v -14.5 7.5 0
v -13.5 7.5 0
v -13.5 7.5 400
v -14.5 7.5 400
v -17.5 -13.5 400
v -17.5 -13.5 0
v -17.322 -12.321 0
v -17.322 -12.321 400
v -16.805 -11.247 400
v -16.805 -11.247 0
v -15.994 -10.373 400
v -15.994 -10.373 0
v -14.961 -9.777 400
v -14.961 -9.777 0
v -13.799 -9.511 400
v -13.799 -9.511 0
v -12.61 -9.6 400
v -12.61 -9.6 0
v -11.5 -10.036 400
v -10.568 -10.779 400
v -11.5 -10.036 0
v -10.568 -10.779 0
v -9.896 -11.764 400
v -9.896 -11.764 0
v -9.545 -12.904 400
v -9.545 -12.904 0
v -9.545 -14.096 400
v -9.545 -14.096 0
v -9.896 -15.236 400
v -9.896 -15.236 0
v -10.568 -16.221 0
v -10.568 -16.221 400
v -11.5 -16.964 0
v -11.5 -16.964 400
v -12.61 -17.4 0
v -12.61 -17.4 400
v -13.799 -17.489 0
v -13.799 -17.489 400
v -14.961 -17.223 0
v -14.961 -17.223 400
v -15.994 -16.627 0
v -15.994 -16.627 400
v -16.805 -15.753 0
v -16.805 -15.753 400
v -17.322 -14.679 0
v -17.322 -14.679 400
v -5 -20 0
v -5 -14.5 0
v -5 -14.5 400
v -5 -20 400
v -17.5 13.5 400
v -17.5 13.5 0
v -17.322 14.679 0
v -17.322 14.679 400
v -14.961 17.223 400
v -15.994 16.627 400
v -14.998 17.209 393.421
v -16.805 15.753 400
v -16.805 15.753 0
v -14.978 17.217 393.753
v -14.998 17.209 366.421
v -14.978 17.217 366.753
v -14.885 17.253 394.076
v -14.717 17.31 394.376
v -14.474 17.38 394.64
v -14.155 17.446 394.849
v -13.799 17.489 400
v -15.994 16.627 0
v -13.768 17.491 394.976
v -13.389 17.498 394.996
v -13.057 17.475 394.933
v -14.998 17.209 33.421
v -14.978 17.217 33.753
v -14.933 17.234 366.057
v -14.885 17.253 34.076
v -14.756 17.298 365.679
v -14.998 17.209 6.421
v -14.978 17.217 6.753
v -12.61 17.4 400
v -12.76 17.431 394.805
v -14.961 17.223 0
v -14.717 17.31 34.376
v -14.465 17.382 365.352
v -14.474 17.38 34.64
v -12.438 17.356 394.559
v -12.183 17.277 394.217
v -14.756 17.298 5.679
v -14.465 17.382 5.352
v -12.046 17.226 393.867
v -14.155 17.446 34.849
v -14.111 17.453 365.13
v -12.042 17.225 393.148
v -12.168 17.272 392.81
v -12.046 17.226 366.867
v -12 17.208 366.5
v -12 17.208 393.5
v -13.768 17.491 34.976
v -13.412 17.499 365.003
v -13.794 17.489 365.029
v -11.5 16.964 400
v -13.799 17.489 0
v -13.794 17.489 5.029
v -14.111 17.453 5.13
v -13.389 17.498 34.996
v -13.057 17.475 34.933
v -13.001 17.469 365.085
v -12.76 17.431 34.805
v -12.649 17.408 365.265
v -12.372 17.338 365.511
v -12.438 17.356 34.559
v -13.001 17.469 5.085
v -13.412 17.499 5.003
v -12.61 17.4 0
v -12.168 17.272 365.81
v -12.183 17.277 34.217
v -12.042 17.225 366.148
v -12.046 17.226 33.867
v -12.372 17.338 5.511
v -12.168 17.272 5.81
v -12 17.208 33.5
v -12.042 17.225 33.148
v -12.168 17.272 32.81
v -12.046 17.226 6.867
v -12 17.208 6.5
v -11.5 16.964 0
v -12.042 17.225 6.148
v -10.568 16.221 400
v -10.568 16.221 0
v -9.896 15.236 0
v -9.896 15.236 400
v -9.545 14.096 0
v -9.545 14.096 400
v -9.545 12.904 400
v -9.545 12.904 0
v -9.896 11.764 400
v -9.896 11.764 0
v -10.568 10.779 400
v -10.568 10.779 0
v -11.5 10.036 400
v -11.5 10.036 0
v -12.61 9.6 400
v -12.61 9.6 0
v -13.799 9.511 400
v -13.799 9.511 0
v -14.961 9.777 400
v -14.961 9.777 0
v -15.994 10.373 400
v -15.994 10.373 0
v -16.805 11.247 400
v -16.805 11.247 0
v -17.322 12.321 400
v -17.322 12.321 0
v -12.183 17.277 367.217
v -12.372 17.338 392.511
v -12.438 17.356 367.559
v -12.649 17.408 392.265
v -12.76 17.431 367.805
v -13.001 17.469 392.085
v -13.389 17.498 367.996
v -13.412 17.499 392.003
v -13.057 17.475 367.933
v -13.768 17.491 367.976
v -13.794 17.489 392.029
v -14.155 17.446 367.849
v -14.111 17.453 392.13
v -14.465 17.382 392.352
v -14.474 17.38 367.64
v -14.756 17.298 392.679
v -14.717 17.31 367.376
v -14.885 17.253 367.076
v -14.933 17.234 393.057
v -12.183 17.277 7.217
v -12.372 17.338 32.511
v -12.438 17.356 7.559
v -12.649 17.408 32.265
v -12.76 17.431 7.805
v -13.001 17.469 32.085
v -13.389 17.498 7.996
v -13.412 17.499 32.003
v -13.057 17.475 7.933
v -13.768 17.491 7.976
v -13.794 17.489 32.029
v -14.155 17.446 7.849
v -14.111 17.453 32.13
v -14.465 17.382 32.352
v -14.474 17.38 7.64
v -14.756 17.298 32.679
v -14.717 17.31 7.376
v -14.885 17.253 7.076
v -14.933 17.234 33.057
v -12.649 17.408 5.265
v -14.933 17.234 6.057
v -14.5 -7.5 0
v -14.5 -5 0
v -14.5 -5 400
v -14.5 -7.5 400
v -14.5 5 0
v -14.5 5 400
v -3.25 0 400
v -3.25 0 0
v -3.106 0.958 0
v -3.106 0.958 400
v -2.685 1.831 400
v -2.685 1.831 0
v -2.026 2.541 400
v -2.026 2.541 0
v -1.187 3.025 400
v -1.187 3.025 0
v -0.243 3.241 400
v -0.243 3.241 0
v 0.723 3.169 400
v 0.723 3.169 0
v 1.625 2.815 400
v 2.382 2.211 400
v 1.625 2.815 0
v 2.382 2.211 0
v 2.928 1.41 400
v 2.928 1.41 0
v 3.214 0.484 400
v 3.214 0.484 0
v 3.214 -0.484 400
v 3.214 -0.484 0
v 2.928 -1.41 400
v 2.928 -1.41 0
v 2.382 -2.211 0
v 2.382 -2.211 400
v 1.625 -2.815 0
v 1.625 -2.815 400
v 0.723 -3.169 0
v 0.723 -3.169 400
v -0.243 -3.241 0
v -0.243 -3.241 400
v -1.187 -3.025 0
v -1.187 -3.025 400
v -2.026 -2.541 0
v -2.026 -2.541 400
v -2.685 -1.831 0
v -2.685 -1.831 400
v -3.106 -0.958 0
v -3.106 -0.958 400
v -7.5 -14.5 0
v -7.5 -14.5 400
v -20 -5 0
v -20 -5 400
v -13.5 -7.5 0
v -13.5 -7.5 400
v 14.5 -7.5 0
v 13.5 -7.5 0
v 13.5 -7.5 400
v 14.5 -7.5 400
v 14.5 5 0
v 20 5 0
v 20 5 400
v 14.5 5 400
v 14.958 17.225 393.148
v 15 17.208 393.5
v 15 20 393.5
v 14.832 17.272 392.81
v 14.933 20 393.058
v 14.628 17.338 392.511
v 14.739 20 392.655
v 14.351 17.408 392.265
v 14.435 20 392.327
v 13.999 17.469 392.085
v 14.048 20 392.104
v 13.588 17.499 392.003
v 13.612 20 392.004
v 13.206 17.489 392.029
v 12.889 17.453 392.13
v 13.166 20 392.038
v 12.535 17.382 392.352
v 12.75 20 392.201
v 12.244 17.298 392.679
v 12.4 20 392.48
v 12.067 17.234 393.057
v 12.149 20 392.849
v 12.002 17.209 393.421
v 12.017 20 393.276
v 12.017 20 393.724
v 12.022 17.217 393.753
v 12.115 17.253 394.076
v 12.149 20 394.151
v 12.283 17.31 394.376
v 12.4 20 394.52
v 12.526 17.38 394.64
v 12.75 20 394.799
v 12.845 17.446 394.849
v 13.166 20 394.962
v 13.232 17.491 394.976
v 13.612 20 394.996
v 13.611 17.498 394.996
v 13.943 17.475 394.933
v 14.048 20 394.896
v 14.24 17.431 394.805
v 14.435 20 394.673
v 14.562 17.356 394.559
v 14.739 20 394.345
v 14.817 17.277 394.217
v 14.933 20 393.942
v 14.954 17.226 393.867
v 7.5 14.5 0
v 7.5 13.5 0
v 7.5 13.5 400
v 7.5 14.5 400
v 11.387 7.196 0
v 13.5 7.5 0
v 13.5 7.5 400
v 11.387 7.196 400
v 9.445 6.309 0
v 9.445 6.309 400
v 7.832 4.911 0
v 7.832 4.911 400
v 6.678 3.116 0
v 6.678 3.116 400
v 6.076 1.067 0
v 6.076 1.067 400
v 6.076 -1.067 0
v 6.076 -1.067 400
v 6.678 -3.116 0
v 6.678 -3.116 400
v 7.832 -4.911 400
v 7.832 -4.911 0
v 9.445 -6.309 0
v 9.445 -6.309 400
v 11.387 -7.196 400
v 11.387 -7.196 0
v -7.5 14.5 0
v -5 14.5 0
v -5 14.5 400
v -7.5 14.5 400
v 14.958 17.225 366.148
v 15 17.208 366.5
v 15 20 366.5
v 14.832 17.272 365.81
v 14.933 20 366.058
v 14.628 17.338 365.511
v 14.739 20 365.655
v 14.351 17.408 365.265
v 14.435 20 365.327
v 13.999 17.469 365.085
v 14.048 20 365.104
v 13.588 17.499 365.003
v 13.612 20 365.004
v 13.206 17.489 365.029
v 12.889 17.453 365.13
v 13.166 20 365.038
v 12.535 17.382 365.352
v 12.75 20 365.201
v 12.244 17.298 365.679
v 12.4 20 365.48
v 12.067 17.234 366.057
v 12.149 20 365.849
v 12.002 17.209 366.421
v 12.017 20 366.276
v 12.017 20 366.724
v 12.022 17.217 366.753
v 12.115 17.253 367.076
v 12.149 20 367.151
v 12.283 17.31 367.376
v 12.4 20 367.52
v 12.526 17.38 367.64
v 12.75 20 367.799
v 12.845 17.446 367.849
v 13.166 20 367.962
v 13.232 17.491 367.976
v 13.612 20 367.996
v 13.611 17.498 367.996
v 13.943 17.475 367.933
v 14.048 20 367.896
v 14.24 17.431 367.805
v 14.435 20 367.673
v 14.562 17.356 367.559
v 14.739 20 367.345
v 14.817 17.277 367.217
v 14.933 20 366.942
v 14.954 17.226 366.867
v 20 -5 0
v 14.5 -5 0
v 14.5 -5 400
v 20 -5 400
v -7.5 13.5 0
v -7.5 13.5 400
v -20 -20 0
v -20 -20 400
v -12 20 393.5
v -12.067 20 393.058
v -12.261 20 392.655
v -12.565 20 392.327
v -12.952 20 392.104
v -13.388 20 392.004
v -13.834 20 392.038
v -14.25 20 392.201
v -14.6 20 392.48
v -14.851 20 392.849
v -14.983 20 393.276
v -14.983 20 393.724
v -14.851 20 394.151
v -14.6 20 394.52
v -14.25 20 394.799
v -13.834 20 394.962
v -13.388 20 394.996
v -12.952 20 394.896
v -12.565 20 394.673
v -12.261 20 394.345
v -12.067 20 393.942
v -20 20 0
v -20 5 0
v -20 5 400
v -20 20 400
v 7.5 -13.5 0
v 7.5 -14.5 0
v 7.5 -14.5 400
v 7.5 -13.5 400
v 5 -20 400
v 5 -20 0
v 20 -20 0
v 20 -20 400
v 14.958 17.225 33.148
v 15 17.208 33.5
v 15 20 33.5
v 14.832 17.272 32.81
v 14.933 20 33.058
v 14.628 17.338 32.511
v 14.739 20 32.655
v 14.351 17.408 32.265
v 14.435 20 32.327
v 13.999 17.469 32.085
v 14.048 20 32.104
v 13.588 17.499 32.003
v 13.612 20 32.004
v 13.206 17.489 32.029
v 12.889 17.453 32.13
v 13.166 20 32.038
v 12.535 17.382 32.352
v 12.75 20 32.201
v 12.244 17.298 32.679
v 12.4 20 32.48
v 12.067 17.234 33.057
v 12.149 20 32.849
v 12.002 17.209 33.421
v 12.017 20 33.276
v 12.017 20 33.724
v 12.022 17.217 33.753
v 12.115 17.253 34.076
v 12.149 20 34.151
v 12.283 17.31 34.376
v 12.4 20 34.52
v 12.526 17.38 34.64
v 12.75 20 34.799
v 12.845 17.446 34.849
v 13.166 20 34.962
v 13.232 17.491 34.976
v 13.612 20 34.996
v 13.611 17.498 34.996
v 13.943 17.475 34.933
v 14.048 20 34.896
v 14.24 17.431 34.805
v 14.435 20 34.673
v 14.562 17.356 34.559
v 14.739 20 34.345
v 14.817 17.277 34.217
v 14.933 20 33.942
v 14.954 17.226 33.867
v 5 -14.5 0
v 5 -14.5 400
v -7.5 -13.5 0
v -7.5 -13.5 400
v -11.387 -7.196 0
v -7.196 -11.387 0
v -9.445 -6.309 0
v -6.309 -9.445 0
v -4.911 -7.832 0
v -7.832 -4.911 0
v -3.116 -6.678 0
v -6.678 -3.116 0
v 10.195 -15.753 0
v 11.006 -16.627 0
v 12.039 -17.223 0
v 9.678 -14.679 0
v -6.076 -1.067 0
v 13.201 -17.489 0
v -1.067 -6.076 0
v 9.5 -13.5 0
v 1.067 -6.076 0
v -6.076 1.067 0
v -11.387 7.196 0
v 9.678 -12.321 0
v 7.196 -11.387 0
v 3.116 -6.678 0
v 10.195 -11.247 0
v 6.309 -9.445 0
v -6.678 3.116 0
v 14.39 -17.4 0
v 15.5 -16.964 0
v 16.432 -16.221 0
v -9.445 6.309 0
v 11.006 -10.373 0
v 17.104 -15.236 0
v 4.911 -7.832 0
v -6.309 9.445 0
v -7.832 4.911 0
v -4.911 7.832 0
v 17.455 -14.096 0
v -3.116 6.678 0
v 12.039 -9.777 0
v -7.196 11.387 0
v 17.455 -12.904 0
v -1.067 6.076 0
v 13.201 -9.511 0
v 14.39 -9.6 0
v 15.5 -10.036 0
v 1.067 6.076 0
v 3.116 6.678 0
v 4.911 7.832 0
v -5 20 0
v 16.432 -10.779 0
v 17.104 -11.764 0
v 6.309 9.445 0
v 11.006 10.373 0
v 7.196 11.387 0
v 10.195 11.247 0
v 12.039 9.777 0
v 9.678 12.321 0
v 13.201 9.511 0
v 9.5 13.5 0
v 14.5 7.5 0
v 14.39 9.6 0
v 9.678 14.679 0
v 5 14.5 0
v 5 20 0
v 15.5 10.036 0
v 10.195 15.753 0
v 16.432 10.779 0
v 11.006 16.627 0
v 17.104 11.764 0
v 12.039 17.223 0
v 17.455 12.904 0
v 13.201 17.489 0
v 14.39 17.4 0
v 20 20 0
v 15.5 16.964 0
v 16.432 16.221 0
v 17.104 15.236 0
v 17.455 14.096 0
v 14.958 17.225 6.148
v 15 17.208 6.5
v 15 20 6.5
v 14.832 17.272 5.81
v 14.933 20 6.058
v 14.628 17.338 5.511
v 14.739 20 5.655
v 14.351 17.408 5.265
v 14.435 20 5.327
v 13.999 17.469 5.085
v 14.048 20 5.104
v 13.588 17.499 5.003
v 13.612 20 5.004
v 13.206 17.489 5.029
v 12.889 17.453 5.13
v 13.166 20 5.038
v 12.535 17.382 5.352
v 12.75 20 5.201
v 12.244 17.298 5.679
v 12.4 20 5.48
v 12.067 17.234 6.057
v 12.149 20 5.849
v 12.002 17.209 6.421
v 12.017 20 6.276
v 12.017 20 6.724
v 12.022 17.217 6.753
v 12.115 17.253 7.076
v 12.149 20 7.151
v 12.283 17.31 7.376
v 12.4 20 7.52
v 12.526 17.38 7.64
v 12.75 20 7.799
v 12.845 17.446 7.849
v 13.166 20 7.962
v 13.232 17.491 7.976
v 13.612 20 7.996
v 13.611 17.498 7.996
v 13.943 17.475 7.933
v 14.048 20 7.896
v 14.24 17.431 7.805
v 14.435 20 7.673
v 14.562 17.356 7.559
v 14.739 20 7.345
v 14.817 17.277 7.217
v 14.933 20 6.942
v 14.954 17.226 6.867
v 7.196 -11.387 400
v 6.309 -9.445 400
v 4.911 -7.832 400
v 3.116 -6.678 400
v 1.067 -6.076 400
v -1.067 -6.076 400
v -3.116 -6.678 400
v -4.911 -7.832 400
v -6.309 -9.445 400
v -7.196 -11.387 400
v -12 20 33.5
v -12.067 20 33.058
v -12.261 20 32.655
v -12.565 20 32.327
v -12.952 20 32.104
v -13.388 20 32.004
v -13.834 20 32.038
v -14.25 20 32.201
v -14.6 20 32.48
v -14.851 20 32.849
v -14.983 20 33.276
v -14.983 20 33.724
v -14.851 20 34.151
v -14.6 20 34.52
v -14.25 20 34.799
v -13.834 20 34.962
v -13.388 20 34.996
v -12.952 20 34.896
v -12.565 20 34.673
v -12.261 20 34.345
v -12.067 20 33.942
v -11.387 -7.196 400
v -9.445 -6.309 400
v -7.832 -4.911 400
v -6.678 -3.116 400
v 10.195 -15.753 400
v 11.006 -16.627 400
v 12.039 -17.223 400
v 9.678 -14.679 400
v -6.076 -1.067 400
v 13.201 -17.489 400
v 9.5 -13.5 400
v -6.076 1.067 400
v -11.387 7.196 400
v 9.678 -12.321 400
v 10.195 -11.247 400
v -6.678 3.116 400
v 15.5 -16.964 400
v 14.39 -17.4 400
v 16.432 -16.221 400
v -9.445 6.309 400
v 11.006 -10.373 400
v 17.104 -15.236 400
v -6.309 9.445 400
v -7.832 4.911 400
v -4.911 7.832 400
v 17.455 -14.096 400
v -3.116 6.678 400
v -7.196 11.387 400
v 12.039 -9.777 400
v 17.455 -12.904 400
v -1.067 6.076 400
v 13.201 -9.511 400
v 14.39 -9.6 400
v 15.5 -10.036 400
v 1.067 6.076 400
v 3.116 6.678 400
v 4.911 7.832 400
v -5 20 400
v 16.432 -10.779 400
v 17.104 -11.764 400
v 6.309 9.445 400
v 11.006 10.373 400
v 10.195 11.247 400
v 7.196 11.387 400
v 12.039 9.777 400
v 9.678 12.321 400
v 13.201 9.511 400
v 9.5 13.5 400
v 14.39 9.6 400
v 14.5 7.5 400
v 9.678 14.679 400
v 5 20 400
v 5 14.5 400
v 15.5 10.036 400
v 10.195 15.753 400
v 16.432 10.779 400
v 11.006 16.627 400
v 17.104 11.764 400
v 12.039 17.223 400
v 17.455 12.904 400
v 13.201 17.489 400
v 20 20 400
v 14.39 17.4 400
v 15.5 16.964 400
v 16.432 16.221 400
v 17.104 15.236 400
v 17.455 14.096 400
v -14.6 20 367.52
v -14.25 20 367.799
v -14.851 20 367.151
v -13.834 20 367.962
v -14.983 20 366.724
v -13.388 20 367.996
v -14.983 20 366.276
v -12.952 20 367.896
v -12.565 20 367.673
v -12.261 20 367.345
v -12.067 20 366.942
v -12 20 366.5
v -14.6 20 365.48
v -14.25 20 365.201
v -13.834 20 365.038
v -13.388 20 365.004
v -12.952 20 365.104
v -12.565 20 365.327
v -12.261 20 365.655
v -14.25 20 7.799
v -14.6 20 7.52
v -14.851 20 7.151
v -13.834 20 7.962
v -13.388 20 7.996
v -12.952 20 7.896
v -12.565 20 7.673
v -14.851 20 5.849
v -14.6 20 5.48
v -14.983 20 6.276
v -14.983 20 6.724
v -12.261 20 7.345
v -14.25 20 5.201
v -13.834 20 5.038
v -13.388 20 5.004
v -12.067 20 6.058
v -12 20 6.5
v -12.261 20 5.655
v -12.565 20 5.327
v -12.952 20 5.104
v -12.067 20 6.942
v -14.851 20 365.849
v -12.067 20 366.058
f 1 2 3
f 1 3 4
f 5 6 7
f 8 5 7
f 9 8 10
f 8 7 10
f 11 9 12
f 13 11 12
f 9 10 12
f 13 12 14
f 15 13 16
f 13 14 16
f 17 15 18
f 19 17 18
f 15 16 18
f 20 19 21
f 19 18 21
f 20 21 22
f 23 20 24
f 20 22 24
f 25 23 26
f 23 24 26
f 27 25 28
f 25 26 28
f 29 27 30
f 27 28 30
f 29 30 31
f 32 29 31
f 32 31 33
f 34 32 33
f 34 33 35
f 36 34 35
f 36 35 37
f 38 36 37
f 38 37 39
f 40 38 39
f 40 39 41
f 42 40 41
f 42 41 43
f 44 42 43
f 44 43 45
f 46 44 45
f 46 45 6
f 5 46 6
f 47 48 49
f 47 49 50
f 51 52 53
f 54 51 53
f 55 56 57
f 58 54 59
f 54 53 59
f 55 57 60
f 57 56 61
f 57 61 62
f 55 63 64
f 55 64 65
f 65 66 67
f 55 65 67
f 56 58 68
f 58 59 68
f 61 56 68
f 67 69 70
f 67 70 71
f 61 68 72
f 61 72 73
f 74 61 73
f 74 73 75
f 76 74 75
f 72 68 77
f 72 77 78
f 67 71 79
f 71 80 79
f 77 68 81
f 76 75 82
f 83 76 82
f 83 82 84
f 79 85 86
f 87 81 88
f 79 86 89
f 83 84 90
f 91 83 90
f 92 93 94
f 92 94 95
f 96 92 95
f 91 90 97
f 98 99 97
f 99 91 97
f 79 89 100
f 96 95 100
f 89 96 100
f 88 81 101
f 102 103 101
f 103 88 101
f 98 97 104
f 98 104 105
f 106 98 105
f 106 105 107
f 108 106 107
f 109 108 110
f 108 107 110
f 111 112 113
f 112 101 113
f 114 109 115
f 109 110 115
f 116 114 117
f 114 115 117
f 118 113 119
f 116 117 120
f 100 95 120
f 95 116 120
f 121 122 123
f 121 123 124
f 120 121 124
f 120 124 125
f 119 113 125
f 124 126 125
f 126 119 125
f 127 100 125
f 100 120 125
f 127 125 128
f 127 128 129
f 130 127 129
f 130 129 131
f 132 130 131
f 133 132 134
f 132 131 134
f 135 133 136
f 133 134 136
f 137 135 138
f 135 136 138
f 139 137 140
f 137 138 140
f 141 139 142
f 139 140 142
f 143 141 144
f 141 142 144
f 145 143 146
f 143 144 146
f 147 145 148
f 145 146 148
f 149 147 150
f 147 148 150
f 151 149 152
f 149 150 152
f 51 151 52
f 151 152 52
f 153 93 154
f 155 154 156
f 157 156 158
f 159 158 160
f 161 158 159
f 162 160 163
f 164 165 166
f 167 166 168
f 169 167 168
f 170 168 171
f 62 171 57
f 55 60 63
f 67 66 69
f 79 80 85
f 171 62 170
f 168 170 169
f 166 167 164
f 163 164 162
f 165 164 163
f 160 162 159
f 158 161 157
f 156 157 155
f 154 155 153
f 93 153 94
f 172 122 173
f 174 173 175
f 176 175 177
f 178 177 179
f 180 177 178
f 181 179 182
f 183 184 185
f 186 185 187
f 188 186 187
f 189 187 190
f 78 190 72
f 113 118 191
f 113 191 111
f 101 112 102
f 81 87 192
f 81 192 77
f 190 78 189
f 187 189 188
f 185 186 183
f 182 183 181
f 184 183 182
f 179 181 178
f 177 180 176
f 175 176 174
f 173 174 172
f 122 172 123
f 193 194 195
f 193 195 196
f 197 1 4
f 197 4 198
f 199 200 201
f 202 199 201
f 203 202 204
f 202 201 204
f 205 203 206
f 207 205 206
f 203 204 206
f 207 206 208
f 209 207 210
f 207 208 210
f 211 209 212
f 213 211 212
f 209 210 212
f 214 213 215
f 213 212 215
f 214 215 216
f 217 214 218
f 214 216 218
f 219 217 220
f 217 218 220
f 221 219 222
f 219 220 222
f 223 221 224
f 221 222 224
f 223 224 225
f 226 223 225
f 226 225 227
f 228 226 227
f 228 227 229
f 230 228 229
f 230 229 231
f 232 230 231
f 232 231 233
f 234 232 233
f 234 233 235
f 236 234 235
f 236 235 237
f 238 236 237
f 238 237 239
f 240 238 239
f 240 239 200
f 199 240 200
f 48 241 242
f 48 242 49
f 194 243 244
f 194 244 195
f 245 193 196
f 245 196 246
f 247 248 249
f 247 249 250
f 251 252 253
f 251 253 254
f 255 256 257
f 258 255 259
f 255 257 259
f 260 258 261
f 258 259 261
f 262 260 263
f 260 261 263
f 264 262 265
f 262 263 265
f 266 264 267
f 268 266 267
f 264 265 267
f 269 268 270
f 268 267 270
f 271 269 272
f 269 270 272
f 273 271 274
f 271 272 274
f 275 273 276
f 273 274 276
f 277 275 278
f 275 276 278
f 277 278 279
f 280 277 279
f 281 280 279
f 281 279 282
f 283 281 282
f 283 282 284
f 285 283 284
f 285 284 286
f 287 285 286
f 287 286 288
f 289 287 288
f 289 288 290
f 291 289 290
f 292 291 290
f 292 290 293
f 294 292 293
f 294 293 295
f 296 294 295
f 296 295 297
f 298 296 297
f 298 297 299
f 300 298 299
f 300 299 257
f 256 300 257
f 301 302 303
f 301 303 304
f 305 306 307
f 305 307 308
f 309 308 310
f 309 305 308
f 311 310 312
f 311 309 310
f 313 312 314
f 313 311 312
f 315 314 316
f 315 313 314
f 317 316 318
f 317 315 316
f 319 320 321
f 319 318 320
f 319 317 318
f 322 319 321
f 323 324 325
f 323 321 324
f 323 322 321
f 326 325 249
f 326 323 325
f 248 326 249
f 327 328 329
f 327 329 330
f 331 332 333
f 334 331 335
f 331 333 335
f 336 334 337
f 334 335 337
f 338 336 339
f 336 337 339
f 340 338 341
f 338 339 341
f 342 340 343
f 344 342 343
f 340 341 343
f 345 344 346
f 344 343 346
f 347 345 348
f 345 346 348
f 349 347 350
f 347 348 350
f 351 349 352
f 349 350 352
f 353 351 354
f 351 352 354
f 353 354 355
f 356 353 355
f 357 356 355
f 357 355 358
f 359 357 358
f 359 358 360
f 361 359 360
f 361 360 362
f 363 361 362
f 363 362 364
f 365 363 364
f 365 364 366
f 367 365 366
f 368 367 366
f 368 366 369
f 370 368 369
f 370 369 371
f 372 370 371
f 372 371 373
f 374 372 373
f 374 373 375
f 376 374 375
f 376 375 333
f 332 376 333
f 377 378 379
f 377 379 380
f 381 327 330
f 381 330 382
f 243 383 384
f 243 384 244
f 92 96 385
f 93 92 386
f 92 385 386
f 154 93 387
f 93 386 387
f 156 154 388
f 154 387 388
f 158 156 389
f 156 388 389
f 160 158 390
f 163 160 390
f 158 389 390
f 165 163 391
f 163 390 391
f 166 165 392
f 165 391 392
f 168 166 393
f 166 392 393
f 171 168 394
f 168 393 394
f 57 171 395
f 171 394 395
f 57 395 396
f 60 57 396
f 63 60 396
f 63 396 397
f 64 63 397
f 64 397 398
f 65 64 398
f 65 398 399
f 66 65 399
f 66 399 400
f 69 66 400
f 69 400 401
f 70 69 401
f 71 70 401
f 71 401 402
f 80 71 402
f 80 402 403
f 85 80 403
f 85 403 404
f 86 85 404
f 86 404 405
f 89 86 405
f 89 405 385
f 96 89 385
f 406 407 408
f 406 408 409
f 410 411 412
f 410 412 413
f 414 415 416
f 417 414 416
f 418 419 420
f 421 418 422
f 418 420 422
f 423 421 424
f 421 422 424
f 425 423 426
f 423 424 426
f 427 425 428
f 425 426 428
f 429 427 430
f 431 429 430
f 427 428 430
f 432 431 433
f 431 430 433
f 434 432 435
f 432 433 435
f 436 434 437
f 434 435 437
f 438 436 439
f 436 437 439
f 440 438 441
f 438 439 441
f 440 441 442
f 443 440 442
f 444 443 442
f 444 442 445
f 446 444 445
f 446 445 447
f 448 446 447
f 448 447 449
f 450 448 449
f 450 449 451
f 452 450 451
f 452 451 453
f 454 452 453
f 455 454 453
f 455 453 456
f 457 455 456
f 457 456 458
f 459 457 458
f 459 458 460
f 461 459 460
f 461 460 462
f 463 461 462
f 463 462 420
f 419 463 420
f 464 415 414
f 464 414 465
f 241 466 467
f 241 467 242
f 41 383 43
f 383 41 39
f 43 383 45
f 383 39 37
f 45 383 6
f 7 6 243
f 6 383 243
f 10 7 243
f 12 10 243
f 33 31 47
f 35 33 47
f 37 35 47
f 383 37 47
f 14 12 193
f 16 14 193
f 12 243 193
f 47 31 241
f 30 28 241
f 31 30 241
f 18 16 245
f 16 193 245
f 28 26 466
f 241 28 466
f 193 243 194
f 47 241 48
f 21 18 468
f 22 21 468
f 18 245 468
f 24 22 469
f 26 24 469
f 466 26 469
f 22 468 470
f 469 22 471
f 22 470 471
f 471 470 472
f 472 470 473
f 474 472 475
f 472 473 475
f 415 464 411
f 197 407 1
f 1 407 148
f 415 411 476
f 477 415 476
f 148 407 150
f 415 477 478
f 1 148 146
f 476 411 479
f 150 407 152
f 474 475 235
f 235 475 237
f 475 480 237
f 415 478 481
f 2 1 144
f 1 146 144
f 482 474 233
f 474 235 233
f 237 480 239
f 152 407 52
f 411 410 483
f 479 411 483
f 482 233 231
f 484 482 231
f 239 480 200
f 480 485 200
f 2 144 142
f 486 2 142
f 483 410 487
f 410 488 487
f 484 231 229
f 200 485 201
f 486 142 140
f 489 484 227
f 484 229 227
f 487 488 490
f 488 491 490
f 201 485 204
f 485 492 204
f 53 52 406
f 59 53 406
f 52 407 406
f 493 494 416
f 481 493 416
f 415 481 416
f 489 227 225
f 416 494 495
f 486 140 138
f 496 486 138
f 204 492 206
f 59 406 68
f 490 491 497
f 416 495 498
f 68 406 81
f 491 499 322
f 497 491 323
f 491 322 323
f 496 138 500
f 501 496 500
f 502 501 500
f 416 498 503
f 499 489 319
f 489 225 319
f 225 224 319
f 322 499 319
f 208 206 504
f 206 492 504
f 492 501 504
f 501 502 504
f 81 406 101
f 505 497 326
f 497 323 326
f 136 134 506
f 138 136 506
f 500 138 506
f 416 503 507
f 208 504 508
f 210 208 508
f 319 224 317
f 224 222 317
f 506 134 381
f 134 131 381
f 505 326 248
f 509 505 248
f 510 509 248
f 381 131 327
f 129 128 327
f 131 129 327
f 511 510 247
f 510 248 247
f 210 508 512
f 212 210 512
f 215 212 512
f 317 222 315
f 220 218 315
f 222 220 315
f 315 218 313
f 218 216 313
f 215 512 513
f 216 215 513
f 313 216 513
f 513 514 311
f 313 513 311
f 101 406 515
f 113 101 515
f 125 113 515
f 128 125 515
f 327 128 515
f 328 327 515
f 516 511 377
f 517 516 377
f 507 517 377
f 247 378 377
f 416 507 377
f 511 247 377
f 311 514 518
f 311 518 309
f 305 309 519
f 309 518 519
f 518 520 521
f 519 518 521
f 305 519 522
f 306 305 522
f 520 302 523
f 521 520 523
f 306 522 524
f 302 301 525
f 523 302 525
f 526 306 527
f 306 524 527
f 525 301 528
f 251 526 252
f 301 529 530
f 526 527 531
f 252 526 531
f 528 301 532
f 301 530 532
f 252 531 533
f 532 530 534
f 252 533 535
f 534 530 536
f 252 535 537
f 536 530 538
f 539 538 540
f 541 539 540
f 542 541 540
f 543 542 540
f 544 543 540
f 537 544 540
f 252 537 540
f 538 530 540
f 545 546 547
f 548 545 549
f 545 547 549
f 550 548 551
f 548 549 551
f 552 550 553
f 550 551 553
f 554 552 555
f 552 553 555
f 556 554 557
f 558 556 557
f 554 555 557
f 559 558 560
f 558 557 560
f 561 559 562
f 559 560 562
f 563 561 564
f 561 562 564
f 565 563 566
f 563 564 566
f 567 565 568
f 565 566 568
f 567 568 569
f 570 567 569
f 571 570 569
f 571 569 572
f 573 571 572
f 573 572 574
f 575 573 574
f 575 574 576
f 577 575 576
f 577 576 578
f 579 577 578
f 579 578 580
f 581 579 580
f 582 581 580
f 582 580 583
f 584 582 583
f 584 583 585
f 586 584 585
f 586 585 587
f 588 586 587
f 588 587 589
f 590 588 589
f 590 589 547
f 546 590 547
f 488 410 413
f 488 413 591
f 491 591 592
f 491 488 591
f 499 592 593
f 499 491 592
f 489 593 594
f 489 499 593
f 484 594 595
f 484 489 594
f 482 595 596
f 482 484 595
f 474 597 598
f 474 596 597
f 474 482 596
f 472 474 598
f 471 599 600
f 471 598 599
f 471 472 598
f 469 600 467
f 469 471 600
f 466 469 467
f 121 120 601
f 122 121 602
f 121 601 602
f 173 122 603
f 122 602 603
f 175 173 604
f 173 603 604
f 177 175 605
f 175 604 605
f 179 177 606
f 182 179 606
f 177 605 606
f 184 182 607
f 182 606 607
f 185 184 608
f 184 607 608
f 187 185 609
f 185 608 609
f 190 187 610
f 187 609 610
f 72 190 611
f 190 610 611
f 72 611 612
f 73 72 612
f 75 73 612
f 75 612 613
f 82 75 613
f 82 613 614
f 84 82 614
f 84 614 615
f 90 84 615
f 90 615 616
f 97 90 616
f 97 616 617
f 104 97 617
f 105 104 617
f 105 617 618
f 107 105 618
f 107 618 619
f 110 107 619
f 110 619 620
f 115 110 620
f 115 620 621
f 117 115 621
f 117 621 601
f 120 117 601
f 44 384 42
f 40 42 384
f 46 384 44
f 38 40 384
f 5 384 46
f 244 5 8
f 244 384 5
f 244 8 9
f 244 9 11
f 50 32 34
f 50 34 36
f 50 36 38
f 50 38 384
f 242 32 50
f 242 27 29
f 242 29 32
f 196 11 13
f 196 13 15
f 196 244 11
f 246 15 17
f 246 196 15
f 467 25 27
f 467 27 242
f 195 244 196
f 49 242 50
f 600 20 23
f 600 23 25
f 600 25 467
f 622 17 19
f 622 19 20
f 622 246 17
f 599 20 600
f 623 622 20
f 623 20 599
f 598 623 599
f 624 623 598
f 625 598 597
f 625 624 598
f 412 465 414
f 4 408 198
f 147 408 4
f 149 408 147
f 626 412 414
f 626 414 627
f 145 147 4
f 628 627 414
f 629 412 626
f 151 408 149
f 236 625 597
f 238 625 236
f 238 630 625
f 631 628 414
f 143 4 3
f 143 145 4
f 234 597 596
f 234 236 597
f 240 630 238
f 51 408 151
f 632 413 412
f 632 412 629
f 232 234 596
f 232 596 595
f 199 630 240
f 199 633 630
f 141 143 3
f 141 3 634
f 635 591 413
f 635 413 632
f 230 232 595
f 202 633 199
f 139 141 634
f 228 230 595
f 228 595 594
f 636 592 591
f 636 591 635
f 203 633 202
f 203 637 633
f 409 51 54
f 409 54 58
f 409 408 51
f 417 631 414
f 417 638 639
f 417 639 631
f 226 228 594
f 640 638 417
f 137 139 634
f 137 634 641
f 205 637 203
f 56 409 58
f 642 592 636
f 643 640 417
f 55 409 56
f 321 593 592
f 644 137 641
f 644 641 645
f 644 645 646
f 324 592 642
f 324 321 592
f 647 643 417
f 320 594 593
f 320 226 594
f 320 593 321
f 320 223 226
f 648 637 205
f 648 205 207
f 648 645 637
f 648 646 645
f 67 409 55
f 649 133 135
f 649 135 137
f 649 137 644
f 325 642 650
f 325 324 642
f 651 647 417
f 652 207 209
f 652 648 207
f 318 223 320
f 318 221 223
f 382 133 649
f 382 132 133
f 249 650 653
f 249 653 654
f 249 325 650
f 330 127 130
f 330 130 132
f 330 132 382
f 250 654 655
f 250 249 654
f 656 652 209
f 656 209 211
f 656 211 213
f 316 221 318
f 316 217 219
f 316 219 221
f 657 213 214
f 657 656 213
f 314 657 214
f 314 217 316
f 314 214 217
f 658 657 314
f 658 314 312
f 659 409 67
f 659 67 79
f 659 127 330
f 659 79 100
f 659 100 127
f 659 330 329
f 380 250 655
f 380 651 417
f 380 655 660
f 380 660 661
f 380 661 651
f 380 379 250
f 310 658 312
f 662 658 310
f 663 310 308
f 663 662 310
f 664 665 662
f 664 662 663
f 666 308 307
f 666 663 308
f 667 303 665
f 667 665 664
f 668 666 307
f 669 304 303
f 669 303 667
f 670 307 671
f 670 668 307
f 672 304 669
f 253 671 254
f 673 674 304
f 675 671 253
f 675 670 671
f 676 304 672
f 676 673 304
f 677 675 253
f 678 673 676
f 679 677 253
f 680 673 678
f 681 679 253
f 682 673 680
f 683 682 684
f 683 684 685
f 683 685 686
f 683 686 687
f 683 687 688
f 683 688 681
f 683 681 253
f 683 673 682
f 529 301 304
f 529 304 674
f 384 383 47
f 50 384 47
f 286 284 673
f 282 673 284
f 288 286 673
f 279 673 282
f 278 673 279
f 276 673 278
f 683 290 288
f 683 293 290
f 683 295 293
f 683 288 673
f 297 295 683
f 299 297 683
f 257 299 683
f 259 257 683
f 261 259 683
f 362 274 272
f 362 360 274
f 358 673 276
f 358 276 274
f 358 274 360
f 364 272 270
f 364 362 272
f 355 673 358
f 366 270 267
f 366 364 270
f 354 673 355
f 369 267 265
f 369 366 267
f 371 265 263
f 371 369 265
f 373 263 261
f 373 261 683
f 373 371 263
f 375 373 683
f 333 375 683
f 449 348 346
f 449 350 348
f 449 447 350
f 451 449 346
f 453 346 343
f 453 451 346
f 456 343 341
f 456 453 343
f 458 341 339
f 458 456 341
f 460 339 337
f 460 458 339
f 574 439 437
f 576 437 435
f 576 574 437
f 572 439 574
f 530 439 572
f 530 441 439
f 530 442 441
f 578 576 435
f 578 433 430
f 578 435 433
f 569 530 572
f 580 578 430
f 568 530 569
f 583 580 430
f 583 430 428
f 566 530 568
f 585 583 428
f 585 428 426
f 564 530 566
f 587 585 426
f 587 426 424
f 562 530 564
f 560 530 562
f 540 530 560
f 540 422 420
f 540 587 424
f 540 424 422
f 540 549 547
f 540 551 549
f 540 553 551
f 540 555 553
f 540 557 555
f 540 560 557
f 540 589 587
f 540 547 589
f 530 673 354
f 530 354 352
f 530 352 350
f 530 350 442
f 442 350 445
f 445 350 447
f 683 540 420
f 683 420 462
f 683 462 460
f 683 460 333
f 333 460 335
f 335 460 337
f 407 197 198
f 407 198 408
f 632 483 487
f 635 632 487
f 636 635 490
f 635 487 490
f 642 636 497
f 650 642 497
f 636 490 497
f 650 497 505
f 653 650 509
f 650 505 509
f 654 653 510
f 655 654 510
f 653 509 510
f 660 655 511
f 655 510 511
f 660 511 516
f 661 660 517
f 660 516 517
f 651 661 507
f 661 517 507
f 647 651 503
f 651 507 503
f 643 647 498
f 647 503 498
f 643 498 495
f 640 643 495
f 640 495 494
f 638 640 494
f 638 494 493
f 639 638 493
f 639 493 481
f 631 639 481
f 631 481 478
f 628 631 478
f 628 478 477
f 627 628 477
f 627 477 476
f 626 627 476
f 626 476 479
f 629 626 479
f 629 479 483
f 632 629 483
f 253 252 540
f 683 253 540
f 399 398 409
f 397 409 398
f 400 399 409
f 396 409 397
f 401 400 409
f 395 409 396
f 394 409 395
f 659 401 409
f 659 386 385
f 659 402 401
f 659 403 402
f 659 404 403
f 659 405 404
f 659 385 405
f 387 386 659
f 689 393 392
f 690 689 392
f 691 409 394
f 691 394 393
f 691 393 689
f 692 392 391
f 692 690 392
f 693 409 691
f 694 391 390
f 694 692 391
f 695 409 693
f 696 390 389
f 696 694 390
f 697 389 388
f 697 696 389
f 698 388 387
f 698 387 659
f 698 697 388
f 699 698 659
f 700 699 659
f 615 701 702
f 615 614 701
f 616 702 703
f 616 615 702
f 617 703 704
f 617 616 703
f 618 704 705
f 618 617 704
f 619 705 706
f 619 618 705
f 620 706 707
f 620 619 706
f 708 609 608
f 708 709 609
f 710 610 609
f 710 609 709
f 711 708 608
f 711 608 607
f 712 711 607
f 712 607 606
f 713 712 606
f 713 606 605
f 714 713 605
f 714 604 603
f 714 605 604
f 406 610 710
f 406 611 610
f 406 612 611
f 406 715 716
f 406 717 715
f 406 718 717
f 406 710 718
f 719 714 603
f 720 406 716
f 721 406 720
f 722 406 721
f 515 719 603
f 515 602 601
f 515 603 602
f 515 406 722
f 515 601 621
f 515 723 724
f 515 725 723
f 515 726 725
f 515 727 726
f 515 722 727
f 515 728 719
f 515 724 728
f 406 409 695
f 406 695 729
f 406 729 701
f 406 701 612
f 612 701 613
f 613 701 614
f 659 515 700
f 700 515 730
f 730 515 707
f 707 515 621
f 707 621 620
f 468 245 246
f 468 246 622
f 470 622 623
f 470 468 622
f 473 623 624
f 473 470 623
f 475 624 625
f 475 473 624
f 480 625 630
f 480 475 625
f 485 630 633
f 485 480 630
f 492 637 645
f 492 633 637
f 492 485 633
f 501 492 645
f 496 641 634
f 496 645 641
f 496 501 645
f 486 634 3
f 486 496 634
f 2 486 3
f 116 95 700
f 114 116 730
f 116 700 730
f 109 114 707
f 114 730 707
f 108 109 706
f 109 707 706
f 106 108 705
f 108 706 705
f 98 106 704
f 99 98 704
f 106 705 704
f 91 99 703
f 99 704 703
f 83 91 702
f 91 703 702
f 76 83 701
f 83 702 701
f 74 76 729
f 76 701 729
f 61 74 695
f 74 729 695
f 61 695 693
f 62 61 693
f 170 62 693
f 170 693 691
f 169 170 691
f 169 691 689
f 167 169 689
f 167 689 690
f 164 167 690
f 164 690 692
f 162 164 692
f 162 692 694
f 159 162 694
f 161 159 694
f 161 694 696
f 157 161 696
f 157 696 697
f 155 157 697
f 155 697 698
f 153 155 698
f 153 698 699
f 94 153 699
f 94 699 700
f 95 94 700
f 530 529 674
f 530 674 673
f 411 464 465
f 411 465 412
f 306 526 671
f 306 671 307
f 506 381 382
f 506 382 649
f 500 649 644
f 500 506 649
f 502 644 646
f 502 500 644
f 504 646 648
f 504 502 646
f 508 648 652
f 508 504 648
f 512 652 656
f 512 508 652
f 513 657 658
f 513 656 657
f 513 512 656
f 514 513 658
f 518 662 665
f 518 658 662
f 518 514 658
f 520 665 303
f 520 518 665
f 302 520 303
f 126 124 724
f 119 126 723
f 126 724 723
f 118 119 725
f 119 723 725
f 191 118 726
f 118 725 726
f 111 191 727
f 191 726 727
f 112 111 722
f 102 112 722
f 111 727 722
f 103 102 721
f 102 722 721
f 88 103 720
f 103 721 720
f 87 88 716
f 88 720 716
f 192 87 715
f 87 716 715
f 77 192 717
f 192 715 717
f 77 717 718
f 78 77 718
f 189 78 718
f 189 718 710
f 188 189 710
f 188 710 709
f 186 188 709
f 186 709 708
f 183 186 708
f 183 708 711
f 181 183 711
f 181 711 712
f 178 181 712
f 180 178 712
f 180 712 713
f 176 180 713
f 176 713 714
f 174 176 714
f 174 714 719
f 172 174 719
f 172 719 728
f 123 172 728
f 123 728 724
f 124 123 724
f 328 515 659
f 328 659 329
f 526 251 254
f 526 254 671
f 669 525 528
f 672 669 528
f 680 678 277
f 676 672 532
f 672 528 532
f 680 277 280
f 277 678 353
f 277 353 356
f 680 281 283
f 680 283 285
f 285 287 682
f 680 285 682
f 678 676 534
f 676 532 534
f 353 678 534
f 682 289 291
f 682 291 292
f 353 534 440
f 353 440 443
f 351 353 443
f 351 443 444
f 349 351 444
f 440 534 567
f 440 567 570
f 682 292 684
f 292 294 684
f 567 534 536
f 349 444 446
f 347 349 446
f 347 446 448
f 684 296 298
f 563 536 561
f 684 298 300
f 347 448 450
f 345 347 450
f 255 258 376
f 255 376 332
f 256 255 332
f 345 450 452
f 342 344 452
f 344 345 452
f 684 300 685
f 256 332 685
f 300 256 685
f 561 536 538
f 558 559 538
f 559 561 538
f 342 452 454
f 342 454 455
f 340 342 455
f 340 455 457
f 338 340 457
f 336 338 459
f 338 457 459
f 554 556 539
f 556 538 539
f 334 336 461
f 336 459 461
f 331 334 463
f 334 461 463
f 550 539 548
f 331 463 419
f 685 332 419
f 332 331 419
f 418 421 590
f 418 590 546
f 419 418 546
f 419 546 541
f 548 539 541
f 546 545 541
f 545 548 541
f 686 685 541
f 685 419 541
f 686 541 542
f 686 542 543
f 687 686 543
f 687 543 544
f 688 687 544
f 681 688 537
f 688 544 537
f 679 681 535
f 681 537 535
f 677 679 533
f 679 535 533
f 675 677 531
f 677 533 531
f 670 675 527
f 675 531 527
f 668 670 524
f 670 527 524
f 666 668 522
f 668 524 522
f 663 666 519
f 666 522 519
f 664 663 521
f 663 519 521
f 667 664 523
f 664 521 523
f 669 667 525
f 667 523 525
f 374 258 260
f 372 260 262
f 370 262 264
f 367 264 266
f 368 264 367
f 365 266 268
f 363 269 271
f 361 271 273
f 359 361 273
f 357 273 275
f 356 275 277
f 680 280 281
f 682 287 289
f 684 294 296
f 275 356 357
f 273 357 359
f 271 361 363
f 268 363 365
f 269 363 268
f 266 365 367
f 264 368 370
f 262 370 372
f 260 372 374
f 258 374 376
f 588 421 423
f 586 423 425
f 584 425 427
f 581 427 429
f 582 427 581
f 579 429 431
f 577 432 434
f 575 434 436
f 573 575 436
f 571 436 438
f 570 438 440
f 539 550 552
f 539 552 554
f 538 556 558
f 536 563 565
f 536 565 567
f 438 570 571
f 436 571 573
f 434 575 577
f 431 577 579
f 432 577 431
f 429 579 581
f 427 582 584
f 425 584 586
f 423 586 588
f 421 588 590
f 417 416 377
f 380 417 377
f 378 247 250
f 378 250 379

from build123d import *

# Parameters (mm, degrees)
SKETCH_1_W           = 40
SKETCH_1_H           = 40
EXTRUDE_1_DEPTH      = 400
SKETCH_2_R           = 3.25
SKETCH_2_R_2         = 4
CUT_EXTRUDE_1_DEPTH  = 401
M3X0_5_2_D           = 2.5
M3X0_5_2_DEPTH       = 7.5
M3X0_5_2_CBORE_D     = 3
M3X0_5_2_CBORE_DEPTH = 6
M3X0_5_2_TIP         = 0.751075774


with BuildPart() as part:
    # 草圖1 → 伸長1 (new body)
    with BuildSketch(Plane.XY):
        Rectangle(SKETCH_1_W, SKETCH_1_H)
    extrude(amount=EXTRUDE_1_DEPTH)

    # 草圖2 → 除料-伸長1 (cut, through all)
    with BuildSketch(Plane(origin=(0, 0, 0), x_dir=(-1, 0, 0), z_dir=(0, 0, -1))):
        Circle(SKETCH_2_R)
        with Locations((-13.5, 13.5)):
            Circle(SKETCH_2_R_2)
        with Locations((13.5, 13.5)):
            Circle(SKETCH_2_R_2)
        with Locations((-13.5, -13.5)):
            Circle(SKETCH_2_R_2)
        with Locations((13.5, -13.5)):
            Circle(SKETCH_2_R_2)
        with BuildLine():
            Line((5, 14.5), (7.5, 14.5))
            Line((7.5, 14.5), (7.5, 13.5))
            ThreePointArc((7.5, 13.5), (0, 6), (-7.5, 13.5))
            Line((-7.5, 13.5), (-7.5, 14.5))
            Line((-7.5, 14.5), (-5, 14.5))
            Line((-5, 14.5), (-5, 20))
            Line((-5, 20), (5, 20))
            Line((5, 20), (5, 14.5))
        make_face()
        with BuildLine():
            Line((14.5, -5), (14.5, -7.5))
            Line((14.5, -7.5), (13.5, -7.5))
            ThreePointArc((13.5, -7.5), (6, 0), (13.5, 7.5))
            Line((13.5, 7.5), (14.5, 7.5))
            Line((14.5, 7.5), (14.5, 5))
            Line((14.5, 5), (20, 5))
            Line((20, 5), (20, -5))
            Line((20, -5), (14.5, -5))
        make_face()
        with BuildLine():
            Line((-5, -14.5), (-7.5, -14.5))
            Line((-7.5, -14.5), (-7.5, -13.5))
            ThreePointArc((-7.5, -13.5), (0, -6), (7.5, -13.5))
            Line((7.5, -13.5), (7.5, -14.5))
            Line((7.5, -14.5), (5, -14.5))
            Line((5, -14.5), (5, -20))
            Line((5, -20), (-5, -20))
            Line((-5, -20), (-5, -14.5))
        make_face()
        with BuildLine():
            Line((-14.5, 5), (-14.5, 7.5))
            Line((-14.5, 7.5), (-13.5, 7.5))
            ThreePointArc((-13.5, 7.5), (-6, 0), (-13.5, -7.5))
            Line((-13.5, -7.5), (-14.5, -7.5))
            Line((-14.5, -7.5), (-14.5, -5))
            Line((-14.5, -5), (-20, -5))
            Line((-20, -5), (-20, 5))
            Line((-20, 5), (-14.5, 5))
        make_face()
    extrude(amount=-CUT_EXTRUDE_1_DEPTH, mode=Mode.SUBTRACT)

    # M3x0.5 螺紋孔2
    with Locations(Plane(origin=(0, 20, 0), x_dir=(1, 0, 0), z_dir=(0, 1, 0))):
        with Locations((-13.5, -6.5), (-13.5, -33.5), (-13.5, -393.5), (-13.5, -366.5), (13.5, -366.5), (13.5, -393.5), (13.5, -33.5), (13.5, -6.5)):
            CounterBoreHole(M3X0_5_2_D / 2, M3X0_5_2_CBORE_D / 2, M3X0_5_2_CBORE_DEPTH, depth=M3X0_5_2_DEPTH)
            with Locations((0, 0, -(M3X0_5_2_DEPTH + M3X0_5_2_TIP / 2))):  # 118° drill point
                Cone(0, M3X0_5_2_D / 2, M3X0_5_2_TIP, mode=Mode.SUBTRACT)


solid = part.part
